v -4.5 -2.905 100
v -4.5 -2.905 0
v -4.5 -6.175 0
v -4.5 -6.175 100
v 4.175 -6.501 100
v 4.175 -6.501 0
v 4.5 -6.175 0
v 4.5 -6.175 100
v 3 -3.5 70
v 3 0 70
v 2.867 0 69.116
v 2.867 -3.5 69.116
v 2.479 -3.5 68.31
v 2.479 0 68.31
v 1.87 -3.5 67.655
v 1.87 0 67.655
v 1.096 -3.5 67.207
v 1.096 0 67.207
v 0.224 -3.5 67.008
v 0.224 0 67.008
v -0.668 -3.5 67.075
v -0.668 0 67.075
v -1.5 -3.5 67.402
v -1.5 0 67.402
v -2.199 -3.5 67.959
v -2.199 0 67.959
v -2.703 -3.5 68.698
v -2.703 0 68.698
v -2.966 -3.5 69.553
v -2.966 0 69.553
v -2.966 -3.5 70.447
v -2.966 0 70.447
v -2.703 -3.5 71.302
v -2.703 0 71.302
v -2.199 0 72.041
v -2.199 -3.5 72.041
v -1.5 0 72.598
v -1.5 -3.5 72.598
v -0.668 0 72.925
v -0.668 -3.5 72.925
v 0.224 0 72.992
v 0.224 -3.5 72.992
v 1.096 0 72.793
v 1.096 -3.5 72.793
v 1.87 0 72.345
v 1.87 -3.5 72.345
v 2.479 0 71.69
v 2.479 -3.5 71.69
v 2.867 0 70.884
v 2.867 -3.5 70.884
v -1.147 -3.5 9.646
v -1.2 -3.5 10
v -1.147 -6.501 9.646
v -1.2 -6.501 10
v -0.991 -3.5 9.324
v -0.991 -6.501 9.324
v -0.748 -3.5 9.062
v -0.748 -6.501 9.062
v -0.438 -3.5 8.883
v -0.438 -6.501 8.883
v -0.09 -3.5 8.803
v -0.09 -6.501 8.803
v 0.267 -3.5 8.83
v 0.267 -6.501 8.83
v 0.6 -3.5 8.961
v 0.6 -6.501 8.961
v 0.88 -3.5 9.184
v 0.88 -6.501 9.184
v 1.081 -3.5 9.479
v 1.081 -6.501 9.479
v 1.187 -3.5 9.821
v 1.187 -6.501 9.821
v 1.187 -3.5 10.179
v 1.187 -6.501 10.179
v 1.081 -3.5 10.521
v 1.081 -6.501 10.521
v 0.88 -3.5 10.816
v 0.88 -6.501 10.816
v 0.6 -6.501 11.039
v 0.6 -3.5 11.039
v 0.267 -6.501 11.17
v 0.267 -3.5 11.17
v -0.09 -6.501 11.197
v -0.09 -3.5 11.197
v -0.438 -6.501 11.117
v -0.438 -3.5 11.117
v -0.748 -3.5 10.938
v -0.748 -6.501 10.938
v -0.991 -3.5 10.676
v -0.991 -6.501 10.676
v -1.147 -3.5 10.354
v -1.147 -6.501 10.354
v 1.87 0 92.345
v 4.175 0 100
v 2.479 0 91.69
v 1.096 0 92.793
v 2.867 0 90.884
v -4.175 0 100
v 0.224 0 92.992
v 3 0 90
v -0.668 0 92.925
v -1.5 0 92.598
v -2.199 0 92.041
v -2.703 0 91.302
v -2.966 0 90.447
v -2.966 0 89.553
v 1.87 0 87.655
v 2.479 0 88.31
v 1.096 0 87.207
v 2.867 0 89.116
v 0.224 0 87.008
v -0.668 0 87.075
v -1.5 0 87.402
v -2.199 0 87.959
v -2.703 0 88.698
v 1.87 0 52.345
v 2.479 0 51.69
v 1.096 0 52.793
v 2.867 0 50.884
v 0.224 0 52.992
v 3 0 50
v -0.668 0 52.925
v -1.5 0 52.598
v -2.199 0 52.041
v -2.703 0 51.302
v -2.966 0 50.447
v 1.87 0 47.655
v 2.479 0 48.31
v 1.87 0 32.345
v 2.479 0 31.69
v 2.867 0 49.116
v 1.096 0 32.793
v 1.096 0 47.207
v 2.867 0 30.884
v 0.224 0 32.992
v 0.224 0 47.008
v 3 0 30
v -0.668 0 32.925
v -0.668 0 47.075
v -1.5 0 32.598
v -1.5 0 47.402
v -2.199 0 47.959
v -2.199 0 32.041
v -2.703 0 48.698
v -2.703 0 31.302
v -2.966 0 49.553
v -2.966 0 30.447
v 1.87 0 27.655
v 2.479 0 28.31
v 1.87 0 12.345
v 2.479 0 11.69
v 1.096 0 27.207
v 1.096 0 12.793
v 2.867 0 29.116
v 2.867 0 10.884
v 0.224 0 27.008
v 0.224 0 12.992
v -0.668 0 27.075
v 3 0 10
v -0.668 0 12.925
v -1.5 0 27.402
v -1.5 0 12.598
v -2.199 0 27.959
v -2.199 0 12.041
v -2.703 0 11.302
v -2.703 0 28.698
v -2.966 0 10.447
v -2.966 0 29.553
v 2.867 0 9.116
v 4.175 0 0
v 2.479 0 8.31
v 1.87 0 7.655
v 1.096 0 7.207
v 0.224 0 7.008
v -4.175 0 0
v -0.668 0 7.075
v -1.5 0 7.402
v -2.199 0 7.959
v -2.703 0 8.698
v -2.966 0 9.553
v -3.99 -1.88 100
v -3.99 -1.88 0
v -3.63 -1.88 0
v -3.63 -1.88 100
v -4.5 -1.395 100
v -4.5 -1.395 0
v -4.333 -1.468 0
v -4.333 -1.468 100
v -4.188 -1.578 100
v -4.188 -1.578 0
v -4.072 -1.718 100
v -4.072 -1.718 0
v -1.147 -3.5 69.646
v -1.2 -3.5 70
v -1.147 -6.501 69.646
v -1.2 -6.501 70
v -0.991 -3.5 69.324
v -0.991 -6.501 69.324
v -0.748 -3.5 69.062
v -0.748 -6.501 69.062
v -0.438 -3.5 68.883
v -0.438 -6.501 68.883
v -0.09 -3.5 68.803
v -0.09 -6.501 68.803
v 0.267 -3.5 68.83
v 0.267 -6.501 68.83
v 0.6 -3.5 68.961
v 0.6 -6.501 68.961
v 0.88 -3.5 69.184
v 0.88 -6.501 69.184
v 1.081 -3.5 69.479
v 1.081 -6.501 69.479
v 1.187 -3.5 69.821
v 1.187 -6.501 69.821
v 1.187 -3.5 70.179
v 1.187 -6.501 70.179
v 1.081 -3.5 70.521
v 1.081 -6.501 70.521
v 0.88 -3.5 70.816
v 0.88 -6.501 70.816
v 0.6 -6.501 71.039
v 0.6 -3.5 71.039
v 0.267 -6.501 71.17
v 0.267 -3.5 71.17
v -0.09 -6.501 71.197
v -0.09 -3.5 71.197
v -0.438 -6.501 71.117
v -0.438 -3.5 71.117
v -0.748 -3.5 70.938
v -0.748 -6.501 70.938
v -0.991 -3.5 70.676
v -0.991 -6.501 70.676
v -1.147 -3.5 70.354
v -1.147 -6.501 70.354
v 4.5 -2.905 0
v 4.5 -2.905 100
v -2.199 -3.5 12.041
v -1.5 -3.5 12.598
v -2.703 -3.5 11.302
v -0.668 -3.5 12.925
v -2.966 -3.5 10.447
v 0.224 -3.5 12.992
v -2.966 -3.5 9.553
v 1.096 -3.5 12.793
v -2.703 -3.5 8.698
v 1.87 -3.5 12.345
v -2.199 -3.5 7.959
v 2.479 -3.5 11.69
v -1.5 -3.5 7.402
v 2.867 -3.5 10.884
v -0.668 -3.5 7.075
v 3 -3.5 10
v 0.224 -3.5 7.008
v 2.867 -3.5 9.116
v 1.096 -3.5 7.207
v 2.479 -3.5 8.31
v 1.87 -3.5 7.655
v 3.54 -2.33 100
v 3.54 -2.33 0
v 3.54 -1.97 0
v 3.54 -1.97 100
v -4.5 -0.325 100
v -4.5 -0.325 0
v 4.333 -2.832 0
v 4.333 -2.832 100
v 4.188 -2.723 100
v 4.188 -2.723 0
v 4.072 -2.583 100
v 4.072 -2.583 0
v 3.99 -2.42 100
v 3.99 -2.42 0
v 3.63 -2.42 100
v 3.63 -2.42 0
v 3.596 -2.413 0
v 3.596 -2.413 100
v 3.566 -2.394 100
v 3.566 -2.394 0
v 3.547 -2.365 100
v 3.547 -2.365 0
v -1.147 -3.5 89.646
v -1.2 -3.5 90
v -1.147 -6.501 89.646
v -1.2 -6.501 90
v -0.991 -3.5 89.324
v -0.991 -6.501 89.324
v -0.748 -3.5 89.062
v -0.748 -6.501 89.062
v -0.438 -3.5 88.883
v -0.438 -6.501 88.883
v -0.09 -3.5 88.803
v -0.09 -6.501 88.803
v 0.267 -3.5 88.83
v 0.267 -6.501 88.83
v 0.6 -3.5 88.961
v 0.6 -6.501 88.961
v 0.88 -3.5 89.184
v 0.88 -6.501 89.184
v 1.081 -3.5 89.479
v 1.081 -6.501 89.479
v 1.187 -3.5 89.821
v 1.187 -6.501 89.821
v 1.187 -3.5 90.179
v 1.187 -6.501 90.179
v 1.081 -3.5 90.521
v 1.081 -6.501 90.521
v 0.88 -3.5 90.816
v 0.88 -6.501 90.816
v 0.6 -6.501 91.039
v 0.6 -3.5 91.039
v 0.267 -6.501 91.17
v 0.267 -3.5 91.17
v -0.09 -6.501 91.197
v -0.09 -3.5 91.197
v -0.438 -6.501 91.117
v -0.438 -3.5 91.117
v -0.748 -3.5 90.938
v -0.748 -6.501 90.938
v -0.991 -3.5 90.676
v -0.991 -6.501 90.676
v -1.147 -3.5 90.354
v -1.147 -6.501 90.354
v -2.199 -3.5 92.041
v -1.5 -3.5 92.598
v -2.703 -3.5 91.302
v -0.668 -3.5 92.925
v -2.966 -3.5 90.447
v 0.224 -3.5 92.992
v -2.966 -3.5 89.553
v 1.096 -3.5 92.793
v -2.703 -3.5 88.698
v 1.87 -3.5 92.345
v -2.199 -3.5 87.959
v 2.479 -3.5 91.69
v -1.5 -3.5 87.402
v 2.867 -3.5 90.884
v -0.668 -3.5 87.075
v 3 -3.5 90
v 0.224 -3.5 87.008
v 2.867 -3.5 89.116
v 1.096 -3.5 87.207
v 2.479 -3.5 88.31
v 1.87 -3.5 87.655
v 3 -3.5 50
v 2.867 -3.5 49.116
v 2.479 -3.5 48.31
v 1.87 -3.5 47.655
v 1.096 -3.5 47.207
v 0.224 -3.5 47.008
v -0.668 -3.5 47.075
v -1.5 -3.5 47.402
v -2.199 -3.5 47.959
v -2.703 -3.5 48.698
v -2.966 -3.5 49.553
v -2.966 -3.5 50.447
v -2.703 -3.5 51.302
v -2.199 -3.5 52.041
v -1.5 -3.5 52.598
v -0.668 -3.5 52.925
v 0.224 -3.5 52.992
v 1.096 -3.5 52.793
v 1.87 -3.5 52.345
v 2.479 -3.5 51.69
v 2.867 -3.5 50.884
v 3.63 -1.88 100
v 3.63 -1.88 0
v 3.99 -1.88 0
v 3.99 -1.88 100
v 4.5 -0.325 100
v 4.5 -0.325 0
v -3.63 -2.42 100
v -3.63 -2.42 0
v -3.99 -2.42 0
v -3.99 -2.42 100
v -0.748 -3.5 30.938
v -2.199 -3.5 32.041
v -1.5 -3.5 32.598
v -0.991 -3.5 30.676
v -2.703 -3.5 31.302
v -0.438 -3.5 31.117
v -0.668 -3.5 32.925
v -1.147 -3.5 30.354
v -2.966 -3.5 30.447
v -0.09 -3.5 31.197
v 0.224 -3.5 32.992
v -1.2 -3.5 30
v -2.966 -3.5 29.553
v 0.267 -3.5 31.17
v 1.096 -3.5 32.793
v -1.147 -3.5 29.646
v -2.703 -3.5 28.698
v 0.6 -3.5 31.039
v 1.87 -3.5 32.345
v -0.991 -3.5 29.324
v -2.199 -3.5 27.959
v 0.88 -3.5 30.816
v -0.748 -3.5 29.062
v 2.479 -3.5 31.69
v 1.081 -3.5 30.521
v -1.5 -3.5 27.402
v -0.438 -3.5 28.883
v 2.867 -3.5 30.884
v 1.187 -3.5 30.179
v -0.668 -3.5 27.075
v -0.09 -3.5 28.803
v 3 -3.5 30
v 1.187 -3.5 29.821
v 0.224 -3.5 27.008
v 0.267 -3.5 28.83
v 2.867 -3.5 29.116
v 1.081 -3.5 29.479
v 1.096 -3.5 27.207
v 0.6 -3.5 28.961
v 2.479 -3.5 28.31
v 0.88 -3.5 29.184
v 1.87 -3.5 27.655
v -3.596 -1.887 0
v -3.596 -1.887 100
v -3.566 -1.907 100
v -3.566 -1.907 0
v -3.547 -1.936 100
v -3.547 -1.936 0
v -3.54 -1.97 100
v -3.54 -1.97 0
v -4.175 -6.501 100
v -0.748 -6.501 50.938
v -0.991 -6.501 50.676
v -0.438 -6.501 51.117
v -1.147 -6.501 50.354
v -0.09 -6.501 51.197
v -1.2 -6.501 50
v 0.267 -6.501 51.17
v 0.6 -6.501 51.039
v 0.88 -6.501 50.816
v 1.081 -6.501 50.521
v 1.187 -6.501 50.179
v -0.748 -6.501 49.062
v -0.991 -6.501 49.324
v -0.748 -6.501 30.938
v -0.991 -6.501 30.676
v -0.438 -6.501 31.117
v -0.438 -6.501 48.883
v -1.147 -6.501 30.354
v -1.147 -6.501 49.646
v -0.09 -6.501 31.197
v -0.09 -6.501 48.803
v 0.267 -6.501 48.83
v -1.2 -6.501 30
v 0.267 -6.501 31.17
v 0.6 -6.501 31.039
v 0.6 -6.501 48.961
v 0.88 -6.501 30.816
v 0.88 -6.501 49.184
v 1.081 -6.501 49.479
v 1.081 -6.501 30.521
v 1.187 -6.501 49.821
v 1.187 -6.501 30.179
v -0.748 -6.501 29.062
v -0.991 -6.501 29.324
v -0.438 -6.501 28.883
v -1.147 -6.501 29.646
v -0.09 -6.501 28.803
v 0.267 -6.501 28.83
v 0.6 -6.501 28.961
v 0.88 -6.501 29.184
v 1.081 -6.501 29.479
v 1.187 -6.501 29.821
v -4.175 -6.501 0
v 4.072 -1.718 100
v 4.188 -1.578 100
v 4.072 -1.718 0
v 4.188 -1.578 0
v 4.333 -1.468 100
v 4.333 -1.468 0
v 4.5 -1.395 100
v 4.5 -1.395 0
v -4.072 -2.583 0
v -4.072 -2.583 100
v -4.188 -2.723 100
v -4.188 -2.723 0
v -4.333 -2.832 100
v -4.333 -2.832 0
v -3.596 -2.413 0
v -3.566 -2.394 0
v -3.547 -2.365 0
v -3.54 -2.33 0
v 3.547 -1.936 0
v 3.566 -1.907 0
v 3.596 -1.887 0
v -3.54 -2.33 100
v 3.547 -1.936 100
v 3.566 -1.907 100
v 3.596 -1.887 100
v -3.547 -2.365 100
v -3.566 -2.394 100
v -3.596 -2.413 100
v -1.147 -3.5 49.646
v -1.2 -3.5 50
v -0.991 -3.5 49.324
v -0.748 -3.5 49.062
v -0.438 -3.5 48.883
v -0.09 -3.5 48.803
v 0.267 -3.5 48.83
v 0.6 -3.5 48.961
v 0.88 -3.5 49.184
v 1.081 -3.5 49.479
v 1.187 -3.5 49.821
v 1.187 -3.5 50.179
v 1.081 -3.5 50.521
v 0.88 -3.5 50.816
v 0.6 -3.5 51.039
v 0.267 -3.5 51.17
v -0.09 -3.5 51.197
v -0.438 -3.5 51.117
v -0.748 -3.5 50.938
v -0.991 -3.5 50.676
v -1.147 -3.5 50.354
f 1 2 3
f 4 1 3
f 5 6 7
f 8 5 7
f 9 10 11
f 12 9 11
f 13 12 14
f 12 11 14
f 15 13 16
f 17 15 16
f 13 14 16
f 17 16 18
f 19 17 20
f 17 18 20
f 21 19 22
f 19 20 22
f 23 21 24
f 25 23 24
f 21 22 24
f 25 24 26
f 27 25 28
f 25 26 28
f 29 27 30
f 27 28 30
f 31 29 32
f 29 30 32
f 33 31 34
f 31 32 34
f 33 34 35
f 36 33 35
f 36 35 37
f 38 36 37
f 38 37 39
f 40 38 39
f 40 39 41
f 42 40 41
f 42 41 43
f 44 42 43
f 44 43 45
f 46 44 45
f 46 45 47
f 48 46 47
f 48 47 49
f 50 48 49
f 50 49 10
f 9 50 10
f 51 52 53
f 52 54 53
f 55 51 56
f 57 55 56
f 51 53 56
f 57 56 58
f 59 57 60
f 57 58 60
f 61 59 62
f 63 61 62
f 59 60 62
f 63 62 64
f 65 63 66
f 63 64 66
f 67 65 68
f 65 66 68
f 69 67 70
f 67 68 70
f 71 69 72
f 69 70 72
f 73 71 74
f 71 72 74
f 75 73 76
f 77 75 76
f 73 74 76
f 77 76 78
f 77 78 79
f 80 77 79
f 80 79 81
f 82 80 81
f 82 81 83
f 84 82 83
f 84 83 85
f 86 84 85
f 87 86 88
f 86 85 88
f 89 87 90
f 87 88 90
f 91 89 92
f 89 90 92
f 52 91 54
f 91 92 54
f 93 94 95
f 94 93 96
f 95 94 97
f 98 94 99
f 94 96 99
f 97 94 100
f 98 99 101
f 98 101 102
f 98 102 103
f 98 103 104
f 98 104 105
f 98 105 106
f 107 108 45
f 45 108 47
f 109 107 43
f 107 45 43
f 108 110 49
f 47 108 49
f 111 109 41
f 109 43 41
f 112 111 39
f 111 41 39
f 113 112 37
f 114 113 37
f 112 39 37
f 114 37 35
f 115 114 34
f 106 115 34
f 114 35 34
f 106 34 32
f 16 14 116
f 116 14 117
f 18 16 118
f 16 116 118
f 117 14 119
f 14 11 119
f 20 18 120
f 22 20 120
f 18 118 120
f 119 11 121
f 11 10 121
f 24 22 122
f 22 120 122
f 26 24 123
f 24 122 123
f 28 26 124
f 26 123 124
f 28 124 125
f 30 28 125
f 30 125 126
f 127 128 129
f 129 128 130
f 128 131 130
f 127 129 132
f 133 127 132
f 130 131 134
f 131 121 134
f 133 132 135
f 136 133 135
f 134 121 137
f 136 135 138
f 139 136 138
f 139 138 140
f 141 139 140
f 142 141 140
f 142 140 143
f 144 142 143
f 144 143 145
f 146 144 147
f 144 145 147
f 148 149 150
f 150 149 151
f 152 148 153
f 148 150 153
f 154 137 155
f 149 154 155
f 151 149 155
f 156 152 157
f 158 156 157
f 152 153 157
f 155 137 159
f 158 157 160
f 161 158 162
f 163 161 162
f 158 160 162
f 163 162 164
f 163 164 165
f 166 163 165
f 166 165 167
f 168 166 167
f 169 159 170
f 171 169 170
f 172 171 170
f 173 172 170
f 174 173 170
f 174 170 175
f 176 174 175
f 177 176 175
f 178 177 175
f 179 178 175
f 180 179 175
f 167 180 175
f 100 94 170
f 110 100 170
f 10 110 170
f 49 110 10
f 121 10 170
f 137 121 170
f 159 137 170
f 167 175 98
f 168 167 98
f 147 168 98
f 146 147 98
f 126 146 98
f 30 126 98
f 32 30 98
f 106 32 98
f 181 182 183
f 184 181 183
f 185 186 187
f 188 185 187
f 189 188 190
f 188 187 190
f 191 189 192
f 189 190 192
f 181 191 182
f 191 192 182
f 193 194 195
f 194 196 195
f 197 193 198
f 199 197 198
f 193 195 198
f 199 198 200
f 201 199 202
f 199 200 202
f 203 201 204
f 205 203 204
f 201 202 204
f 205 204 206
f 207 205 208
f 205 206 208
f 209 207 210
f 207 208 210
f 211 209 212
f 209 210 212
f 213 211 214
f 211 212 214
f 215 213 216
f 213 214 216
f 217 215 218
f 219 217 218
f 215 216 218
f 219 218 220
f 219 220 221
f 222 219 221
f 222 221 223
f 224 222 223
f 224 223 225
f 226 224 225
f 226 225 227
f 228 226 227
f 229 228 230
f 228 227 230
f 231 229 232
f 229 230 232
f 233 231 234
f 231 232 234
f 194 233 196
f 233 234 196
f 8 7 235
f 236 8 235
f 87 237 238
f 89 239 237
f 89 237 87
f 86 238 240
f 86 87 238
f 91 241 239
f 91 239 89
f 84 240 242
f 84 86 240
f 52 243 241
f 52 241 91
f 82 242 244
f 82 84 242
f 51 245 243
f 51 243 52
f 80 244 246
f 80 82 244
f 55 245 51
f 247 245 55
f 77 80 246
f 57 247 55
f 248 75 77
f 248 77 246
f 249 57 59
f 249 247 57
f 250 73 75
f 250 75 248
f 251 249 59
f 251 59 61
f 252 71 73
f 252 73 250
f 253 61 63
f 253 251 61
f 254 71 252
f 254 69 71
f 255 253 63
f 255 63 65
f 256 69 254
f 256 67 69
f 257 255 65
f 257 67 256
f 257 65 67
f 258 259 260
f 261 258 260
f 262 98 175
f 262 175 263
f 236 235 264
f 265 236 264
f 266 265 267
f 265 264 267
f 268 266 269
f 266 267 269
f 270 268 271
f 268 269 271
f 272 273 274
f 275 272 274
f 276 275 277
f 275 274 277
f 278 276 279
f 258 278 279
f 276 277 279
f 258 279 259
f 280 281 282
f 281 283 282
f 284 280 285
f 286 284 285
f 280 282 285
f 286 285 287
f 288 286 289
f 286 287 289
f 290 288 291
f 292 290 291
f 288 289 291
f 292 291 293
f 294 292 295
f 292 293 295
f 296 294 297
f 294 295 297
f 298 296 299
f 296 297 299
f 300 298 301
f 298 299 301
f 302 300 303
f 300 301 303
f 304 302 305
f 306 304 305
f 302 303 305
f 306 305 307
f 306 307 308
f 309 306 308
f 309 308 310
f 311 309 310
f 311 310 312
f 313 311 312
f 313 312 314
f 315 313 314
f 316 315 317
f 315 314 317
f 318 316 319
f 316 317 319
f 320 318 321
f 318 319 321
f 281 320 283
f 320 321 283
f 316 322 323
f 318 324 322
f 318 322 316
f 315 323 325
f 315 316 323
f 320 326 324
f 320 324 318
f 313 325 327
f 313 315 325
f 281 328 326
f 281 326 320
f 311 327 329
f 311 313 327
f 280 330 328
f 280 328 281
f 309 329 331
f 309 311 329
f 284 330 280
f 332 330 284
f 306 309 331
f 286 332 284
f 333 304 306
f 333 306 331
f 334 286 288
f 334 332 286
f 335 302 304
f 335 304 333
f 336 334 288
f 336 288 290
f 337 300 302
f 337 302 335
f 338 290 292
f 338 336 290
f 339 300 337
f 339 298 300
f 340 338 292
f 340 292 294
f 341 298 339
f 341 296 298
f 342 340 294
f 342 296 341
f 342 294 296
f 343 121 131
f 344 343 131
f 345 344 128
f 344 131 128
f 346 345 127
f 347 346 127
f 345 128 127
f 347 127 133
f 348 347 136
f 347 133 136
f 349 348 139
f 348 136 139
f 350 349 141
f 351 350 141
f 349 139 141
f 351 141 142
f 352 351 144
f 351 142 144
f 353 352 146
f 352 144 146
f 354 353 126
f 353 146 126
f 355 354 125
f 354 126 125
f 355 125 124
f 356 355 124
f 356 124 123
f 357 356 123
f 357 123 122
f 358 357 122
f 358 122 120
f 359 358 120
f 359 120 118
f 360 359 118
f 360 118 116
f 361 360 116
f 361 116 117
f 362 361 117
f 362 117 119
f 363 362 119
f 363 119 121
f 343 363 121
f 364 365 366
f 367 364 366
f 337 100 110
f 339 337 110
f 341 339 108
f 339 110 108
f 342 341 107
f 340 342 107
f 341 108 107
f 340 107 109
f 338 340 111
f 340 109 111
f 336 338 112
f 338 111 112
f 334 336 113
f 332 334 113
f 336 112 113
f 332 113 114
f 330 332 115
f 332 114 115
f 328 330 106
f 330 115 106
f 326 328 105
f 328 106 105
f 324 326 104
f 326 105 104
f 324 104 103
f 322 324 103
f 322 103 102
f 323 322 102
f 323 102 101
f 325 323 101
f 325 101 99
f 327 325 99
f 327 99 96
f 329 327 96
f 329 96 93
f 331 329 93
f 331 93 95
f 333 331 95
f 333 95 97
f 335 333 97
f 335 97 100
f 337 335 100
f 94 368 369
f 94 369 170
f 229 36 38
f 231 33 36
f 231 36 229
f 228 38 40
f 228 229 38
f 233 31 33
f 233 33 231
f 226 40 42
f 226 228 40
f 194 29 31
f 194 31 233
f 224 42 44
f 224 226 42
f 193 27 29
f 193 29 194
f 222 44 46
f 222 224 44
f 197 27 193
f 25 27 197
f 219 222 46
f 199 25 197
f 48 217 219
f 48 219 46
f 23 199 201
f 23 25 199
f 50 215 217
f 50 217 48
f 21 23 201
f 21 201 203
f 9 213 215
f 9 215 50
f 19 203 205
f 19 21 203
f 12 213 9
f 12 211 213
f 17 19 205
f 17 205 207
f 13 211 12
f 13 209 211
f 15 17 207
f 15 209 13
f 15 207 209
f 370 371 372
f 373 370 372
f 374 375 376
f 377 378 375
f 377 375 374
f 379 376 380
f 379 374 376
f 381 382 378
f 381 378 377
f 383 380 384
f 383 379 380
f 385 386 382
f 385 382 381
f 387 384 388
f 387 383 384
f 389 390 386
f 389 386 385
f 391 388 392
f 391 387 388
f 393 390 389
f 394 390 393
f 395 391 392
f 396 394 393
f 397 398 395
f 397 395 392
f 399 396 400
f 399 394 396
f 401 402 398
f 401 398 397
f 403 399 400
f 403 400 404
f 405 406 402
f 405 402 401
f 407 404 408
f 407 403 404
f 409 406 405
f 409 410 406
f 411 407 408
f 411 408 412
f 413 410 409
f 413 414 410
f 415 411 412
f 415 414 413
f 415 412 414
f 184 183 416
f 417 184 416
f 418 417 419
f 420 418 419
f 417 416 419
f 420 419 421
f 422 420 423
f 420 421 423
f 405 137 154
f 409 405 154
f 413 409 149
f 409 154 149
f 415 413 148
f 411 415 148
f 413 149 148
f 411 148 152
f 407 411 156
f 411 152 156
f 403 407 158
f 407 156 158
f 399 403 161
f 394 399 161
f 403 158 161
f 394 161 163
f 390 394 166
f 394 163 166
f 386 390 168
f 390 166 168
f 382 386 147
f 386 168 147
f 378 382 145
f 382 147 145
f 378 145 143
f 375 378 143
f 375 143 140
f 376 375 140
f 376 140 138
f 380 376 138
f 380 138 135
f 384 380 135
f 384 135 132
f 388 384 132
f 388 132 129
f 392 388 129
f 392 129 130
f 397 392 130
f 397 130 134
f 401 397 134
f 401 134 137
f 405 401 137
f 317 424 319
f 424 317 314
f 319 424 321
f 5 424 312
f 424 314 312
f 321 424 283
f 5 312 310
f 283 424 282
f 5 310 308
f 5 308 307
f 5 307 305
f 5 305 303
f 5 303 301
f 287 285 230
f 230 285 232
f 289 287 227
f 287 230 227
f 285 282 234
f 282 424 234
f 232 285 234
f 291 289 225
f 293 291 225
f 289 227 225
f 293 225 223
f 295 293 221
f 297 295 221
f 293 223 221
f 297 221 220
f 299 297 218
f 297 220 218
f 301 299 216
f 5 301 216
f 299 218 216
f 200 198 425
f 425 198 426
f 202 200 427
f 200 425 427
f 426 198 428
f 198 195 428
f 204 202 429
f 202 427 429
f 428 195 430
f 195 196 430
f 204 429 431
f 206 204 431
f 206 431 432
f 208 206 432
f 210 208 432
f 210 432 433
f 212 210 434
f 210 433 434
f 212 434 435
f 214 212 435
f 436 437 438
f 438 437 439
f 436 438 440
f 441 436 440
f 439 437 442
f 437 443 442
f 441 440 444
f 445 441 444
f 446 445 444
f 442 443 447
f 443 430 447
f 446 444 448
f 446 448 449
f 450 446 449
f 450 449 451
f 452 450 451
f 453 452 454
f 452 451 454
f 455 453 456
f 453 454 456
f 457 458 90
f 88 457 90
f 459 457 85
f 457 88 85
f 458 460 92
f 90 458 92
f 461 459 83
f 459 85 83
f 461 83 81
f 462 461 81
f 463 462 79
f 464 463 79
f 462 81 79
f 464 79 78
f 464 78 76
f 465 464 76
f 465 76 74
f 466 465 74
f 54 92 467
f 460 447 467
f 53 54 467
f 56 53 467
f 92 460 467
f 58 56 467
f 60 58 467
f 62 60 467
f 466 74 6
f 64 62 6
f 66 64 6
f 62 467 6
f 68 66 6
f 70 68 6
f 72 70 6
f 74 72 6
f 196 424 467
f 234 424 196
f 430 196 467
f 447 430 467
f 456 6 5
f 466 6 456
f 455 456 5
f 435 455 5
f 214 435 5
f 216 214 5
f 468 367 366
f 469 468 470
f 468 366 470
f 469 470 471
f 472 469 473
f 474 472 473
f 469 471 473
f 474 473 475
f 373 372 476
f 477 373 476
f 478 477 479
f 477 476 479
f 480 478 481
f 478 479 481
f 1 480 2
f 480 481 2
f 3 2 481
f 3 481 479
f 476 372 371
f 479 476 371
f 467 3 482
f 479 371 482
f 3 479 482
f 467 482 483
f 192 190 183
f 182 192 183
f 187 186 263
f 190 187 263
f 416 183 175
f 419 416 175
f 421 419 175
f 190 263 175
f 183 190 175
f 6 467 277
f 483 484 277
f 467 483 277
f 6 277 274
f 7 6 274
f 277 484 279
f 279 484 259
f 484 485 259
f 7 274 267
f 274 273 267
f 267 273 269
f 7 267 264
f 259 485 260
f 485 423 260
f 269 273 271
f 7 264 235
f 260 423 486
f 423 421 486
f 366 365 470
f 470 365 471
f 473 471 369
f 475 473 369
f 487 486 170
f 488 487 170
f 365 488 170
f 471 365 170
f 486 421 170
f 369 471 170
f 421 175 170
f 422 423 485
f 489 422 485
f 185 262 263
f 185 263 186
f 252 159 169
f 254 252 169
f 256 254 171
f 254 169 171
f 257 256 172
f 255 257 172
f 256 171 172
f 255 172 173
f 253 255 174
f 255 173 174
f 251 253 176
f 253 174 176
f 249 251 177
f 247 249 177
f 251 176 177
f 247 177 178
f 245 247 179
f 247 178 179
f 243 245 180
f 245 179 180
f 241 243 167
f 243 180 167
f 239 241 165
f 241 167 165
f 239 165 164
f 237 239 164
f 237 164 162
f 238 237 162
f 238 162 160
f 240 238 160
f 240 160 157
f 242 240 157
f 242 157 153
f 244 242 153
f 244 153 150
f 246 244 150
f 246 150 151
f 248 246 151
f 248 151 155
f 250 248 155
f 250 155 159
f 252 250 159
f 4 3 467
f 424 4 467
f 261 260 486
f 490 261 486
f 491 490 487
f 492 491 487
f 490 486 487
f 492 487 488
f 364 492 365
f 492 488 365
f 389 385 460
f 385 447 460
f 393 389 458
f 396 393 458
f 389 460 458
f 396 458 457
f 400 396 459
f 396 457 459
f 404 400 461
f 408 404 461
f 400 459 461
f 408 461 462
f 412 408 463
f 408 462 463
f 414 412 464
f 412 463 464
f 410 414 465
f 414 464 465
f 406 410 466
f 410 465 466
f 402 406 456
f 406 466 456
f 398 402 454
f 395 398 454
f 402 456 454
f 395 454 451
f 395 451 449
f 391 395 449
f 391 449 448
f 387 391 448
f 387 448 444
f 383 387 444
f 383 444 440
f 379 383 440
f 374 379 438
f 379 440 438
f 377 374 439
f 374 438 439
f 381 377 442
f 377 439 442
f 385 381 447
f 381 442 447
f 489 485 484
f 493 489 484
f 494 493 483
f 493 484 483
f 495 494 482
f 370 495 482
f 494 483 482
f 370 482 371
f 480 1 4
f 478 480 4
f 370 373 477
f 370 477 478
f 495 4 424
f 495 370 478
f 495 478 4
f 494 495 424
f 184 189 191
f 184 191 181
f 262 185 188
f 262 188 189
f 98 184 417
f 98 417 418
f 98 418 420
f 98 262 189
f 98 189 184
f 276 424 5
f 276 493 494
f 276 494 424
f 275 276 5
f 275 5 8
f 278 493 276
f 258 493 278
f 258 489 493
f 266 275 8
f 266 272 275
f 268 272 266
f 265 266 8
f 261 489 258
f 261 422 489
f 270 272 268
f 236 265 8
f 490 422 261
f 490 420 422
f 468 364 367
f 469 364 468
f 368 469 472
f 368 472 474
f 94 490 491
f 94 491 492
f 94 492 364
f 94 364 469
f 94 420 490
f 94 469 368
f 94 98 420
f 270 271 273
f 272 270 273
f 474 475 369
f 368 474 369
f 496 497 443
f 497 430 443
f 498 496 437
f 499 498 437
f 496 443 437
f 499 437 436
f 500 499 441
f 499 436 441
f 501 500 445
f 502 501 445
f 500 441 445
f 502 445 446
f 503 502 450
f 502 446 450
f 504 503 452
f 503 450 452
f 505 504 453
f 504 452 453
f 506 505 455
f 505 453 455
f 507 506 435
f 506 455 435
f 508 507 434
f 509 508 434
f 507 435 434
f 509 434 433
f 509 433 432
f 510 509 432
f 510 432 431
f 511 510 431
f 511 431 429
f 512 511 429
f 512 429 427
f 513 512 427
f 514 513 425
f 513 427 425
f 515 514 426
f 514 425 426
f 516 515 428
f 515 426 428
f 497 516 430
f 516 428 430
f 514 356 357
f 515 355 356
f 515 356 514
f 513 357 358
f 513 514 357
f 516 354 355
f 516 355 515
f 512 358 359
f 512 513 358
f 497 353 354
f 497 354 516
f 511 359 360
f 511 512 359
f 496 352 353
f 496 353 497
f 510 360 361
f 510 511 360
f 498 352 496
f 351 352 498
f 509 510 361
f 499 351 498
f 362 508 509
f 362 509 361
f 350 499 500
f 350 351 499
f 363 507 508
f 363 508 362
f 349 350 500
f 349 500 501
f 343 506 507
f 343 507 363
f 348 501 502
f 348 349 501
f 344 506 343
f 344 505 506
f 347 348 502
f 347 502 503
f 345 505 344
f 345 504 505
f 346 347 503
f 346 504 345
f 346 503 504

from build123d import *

# Parameters (mm, degrees)
EXTRUDE_1_DEPTH              = 100
HOLE_WIZARD_M2_1_D           = 2.4
HOLE_WIZARD_M2_1_CBORE_D     = 6
HOLE_WIZARD_M2_1_CBORE_DEPTH = 3.5
PATTERN_LINEAR_1_COUNT       = 5
PATTERN_LINEAR_1_PITCH       = 20


with BuildPart() as part:
    # 草图1 → 凸台-拉伸1 (new body)
    with BuildSketch(Plane.XY):
        with BuildLine():
            Line((-4.5, -2.905269119), (-4.5, -6.175269119))
            Line((-4.5, -6.175269119), (-4.174730881, -6.500538239))
            Line((-4.174730881, -6.500538239), (0, -6.500538239))
            Line((0, -6.500538239), (4.174730881, -6.500538239))
            Line((4.174730881, -6.500538239), (4.5, -6.175269119))
            Line((4.5, -6.175269119), (4.5, -2.905269119))
            ThreePointArc((4.5, -2.905269119), (4.188070601, -2.722678698), (3.990111871, -2.420269119))
            Line((3.990111871, -2.420269119), (3.630111871, -2.420269119))
            ThreePointArc((3.630111871, -2.420269119), (3.566472261, -2.39390873), (3.540111871, -2.330269119))
            Line((3.540111871, -2.330269119), (3.540111871, -1.970269119))
            ThreePointArc((3.540111871, -1.970269119), (3.566472261, -1.906629509), (3.630111871, -1.880269119))
            Line((3.630111871, -1.880269119), (3.990111871, -1.880269119))
            ThreePointArc((3.990111871, -1.880269119), (4.188070601, -1.577859541), (4.5, -1.395269119))
            Line((4.5, -1.395269119), (4.5, -0.325269119))
            Line((4.5, -0.325269119), (4.174730881, 0))
            Line((4.174730881, 0), (0, 0))
            Line((0, 0), (-4.174730881, 0))
            Line((-4.174730881, 0), (-4.5, -0.325269119))
            Line((-4.5, -0.325269119), (-4.5, -1.395269119))
            ThreePointArc((-4.5, -1.395269119), (-4.188070601, -1.577859541), (-3.990111871, -1.880269119))
            Line((-3.990111871, -1.880269119), (-3.630111871, -1.880269119))
            ThreePointArc((-3.630111871, -1.880269119), (-3.566472261, -1.906629509), (-3.540111871, -1.970269119))
            Line((-3.540111871, -1.970269119), (-3.540111871, -2.330269119))
            ThreePointArc((-3.540111871, -2.330269119), (-3.566472261, -2.39390873), (-3.630111871, -2.420269119))
            Line((-3.630111871, -2.420269119), (-3.990111871, -2.420269119))
            ThreePointArc((-3.990111871, -2.420269119), (-4.188070601, -2.722678698), (-4.5, -2.905269119))
        make_face()
    extrude(amount=EXTRUDE_1_DEPTH)

    # M2 六角头螺栓的柱形沉头孔1 (through all)
    with Locations(Plane(origin=(0, 0, 0), x_dir=(1, 0, 0), z_dir=(0, 1, 0))):
        with Locations((0, -90)):
            hole_wizard_m2_1 = CounterBoreHole(HOLE_WIZARD_M2_1_D / 2, HOLE_WIZARD_M2_1_CBORE_D / 2, HOLE_WIZARD_M2_1_CBORE_DEPTH)

    # 阵列(线性)1: M2 六角头螺栓的柱形沉头孔1 ×5
    with Locations(*[(0, 0, -i * PATTERN_LINEAR_1_PITCH) for i in range(1, PATTERN_LINEAR_1_COUNT)]):
        add(hole_wizard_m2_1, mode=Mode.SUBTRACT)


solid = part.part
